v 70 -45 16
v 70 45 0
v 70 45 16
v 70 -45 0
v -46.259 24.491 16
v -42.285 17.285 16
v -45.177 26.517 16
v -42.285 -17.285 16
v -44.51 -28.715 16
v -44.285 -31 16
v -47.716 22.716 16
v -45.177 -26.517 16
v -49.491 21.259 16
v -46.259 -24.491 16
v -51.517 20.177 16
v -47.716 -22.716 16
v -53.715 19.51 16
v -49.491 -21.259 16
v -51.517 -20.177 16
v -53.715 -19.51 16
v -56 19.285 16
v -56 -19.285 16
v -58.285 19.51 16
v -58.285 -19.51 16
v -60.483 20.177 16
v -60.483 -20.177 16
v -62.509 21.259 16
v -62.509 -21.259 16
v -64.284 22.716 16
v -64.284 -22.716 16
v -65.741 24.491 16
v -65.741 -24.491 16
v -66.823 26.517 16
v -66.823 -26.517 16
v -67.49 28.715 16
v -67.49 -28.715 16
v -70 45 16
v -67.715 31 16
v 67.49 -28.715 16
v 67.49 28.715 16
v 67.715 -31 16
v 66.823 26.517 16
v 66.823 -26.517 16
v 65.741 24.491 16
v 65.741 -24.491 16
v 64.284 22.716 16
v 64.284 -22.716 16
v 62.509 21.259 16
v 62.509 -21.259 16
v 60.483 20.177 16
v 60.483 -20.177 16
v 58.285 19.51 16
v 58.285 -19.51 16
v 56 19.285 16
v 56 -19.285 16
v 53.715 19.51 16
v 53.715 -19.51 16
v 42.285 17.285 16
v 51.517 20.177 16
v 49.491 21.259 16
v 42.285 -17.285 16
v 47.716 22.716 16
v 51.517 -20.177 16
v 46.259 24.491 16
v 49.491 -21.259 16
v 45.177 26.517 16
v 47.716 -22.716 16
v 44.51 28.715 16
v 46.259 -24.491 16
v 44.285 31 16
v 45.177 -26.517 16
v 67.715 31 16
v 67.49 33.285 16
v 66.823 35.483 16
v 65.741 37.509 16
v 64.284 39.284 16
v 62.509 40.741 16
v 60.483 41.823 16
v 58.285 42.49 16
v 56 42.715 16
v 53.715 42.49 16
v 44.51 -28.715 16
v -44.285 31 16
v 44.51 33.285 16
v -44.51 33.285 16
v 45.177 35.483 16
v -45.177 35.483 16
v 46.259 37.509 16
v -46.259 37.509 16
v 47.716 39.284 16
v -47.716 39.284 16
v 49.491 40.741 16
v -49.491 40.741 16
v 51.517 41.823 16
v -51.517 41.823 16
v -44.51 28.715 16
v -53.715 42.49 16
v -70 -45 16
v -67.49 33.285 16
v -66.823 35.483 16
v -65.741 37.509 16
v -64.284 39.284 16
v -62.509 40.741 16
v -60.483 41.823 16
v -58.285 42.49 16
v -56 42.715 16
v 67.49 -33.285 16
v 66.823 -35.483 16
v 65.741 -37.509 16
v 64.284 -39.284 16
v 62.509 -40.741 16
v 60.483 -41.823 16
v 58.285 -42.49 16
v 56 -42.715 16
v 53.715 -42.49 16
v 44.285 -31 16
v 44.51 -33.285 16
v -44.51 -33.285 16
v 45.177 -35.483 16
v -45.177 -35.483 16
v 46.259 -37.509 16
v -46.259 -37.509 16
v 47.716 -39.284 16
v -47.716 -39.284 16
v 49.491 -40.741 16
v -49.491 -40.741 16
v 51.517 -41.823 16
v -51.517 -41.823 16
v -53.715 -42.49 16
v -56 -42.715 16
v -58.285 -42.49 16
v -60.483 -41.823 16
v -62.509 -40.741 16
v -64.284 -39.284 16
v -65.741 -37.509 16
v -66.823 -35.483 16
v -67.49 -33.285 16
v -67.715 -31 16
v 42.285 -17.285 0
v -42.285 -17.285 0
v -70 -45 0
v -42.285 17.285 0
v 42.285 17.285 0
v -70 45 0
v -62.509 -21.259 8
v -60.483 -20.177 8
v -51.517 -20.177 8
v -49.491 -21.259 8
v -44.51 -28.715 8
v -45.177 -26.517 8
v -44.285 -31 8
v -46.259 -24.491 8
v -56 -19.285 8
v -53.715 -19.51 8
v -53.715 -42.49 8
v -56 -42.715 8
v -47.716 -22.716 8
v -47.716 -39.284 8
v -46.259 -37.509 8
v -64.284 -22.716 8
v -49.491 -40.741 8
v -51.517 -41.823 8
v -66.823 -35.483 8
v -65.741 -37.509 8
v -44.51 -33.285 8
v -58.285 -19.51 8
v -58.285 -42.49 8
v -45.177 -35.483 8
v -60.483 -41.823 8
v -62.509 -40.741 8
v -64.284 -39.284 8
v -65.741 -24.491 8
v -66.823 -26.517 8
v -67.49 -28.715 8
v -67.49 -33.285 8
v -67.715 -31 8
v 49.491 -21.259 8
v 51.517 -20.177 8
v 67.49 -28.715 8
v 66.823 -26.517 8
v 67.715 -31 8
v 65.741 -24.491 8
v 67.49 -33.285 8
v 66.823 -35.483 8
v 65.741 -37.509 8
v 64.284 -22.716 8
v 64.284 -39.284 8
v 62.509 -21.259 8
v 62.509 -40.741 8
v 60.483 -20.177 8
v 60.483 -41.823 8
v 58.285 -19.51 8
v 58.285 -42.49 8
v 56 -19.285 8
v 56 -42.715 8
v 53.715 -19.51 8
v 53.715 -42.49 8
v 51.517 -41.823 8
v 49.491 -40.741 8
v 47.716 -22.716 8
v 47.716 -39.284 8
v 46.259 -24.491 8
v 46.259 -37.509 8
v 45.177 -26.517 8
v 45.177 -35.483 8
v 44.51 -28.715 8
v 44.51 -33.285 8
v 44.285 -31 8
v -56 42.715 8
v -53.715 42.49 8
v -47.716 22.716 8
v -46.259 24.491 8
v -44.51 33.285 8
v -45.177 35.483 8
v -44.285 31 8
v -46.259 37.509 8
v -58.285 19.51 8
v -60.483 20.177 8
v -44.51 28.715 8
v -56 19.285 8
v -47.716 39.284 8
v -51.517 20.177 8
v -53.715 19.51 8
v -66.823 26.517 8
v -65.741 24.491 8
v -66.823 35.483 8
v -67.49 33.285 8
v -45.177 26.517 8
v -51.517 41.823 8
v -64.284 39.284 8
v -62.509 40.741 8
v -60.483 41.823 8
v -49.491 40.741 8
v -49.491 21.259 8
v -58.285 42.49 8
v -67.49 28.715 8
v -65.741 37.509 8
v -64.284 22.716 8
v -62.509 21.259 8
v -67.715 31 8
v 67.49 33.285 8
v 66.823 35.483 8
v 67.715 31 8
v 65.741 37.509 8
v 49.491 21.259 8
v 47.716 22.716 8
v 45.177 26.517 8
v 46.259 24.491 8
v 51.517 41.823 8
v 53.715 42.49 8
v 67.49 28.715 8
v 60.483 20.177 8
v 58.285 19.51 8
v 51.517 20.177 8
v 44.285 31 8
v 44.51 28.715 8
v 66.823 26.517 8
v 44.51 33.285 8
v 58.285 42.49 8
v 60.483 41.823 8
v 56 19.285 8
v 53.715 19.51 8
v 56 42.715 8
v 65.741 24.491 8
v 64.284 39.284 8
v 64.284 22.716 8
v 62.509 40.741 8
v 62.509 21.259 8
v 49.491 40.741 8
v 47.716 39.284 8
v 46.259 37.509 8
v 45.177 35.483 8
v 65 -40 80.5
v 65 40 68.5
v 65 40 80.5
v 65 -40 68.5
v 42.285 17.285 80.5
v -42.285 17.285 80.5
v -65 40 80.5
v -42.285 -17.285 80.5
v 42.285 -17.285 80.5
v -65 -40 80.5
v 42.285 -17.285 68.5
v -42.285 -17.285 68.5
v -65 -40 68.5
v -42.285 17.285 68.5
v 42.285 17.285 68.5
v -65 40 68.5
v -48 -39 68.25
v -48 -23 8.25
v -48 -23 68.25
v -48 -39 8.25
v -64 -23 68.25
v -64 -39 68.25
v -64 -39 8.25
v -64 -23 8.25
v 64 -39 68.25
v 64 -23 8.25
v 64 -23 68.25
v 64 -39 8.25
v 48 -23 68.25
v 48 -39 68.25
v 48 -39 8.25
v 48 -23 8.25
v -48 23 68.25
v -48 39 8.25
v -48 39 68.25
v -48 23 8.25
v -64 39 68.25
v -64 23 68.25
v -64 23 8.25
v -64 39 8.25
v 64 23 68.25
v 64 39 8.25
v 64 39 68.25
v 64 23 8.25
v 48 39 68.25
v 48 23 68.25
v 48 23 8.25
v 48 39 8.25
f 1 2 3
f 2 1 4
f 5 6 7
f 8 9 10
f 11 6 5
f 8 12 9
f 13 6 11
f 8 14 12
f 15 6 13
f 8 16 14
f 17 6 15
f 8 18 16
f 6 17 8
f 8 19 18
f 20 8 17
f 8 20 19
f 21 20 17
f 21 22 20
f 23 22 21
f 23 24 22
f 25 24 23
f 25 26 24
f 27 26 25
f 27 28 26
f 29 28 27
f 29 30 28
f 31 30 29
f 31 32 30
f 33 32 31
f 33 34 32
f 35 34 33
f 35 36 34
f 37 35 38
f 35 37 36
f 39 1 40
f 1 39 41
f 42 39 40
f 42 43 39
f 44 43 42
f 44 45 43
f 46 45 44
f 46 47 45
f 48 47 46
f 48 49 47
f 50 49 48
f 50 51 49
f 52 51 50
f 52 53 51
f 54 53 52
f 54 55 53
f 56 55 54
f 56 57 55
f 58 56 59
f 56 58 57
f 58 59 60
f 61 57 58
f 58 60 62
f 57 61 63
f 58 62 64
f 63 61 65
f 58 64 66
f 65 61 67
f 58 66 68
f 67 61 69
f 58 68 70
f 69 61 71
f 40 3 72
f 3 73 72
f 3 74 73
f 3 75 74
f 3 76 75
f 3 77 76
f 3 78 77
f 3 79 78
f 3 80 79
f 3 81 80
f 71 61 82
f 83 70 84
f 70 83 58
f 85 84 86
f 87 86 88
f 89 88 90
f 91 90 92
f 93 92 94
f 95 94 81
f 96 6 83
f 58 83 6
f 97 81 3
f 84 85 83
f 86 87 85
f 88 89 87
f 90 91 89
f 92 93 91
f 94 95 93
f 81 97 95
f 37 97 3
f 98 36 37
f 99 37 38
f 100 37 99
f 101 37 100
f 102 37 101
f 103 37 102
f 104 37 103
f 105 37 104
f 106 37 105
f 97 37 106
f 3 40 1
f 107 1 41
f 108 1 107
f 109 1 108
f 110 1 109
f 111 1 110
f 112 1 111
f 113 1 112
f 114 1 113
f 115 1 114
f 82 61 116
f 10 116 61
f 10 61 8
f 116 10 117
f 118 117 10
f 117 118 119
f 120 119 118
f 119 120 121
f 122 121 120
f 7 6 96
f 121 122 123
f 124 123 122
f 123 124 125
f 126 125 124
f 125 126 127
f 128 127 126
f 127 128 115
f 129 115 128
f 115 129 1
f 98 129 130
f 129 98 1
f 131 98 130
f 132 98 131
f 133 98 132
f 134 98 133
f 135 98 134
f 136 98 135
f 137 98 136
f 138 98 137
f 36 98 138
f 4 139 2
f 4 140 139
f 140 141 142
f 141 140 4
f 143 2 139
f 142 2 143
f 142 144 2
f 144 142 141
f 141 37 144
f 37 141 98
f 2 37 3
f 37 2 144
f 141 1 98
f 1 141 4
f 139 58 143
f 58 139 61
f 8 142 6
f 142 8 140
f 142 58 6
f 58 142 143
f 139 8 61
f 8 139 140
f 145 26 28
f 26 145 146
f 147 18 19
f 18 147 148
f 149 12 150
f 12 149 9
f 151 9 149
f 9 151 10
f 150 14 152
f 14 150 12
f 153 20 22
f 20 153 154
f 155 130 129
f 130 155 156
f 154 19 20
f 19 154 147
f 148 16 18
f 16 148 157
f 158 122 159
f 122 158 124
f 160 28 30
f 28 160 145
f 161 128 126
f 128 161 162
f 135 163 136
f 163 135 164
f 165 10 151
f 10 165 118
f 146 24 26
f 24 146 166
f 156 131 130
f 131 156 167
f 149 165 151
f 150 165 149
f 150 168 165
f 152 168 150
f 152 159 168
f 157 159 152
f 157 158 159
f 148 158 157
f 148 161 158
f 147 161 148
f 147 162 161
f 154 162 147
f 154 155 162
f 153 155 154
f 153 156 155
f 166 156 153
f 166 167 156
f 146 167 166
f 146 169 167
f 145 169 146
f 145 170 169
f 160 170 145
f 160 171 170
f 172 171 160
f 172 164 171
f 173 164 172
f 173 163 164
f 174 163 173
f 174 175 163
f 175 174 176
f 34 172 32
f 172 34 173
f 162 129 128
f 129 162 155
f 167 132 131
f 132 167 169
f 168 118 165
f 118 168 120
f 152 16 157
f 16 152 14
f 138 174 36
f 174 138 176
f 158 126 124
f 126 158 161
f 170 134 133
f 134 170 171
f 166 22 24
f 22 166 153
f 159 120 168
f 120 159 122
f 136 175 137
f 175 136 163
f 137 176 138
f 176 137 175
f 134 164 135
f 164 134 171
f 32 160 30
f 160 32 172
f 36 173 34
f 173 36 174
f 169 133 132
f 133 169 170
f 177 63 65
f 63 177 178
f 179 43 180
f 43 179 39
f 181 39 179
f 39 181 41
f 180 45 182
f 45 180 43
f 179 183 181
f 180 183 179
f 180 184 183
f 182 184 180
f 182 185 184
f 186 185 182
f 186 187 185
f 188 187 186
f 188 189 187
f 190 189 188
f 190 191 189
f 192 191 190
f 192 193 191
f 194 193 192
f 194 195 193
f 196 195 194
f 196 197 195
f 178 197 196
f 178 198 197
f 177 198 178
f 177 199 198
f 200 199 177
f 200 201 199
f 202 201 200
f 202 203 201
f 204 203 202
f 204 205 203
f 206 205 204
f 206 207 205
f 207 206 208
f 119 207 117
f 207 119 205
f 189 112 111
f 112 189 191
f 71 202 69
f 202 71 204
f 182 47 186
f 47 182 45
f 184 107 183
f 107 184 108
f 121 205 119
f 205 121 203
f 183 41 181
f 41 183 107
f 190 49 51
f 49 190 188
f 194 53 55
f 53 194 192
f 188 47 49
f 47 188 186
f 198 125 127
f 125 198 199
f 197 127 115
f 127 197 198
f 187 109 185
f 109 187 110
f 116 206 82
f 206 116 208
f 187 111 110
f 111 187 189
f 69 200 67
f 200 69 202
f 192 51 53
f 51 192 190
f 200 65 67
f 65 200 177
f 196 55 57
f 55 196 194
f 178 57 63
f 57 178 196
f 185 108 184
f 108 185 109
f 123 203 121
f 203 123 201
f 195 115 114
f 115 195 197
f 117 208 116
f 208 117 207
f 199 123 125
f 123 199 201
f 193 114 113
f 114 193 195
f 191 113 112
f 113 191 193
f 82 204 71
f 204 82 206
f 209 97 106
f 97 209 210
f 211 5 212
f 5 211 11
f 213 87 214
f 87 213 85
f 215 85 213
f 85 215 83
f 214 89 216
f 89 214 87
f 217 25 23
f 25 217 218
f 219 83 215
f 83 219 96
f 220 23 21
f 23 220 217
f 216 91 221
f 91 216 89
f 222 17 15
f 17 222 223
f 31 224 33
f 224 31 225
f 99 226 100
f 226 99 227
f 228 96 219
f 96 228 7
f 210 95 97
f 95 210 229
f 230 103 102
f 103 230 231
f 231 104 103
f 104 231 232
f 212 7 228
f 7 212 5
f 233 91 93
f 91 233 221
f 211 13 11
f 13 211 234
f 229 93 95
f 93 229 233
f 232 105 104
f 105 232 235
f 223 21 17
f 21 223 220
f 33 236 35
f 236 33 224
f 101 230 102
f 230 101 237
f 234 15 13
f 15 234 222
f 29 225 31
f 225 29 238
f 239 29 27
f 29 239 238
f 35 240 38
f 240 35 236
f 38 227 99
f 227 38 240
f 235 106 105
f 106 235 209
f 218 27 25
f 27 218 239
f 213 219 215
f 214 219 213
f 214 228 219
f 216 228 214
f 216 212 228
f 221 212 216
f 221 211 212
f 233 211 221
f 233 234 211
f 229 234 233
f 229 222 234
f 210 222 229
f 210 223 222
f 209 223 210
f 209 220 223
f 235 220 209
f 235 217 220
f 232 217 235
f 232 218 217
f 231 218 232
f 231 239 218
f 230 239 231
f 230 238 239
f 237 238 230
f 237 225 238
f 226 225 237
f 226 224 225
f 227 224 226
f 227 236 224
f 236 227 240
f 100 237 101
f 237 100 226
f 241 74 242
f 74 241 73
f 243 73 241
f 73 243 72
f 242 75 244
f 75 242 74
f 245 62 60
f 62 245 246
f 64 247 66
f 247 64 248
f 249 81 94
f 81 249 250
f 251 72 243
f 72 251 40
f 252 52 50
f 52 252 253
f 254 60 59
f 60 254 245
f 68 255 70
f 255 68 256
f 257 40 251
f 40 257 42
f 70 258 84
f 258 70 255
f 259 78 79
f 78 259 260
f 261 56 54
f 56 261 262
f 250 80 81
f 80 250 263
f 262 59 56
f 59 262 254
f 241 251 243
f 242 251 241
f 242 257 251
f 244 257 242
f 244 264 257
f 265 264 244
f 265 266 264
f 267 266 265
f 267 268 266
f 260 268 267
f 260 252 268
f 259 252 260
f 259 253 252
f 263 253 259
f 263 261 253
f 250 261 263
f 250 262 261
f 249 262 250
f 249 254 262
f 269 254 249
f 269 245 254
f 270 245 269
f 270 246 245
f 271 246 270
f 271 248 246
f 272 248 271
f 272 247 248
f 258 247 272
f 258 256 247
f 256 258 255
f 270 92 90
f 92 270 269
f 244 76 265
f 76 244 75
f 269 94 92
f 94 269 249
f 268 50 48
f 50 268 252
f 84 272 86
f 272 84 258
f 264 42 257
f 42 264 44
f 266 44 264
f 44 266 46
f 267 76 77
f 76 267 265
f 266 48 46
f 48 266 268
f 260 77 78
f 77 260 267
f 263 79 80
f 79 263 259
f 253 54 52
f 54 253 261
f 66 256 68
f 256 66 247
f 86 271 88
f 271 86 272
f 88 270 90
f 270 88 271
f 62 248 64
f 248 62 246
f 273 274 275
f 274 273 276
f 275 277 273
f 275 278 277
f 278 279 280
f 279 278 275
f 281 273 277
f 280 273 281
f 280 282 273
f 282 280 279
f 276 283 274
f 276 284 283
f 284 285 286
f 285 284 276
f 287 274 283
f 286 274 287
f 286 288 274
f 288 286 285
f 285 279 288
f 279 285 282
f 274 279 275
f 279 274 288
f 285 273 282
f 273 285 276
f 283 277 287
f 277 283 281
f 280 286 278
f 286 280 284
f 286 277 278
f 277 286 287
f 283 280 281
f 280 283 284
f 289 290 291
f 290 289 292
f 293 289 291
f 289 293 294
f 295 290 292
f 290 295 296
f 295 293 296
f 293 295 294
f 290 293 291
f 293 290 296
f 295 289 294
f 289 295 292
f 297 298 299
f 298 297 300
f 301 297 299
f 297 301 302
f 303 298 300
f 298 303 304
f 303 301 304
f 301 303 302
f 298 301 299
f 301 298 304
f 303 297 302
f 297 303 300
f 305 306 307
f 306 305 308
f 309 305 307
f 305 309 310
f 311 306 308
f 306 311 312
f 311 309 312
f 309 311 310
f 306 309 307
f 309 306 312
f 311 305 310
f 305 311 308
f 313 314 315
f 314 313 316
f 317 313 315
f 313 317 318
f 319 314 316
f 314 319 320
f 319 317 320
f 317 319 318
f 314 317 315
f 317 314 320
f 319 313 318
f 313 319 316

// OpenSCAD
$fn = 32;

// ------------------------------------------------------------------------
// Frame cube: base 140 x 90 mm, posts 60 mm tall
// Every part is its own module, assembly() places every instance.
// ------------------------------------------------------------------------

// --- part 1 ---
module base_frame() {
  difference() {
    translate([-70, -45, 0]) cube([140, 90, 16]);
    translate([-42.285, -17.285, -1]) cube([84.57, 34.57, 18]);
    translate([-56, -31, 8]) cylinder(h = 9, d = 23.43);
    translate([56, -31, 8]) cylinder(h = 9, d = 23.43);
    translate([-56, 31, 8]) cylinder(h = 9, d = 23.43);
    translate([56, 31, 8]) cylinder(h = 9, d = 23.43);
  }
}

// --- part 2 ---
module corner_post() {
  translate([-8, -8, 0]) cube([16, 16, 60]);
}

// --- part 3 ---
module top_frame() {
  difference() {
    translate([-65, -40, 0]) cube([130, 80, 12]);
    translate([-42.285, -17.285, -1]) cube([84.57, 34.57, 14]);
  }
}

// --- assembly ---
module assembly() {
  color([0.80, 0.24, 0.20]) translate([0, 0, 0]) rotate([0, 0, 0]) base_frame();
  color([0.20, 0.45, 0.75]) translate([-56, -31, 8.25]) rotate([0, 0, 0]) corner_post();
  color([0.25, 0.62, 0.32]) translate([56, -31, 8.25]) rotate([0, 0, 0]) corner_post();
  color([0.92, 0.70, 0.18]) translate([-56, 31, 8.25]) rotate([0, 0, 0]) corner_post();
  color([0.58, 0.35, 0.70]) translate([56, 31, 8.25]) rotate([0, 0, 0]) corner_post();
  color([0.16, 0.66, 0.66]) translate([0, 0, 68.5]) rotate([0, 0, 0]) top_frame();
}

assembly();
